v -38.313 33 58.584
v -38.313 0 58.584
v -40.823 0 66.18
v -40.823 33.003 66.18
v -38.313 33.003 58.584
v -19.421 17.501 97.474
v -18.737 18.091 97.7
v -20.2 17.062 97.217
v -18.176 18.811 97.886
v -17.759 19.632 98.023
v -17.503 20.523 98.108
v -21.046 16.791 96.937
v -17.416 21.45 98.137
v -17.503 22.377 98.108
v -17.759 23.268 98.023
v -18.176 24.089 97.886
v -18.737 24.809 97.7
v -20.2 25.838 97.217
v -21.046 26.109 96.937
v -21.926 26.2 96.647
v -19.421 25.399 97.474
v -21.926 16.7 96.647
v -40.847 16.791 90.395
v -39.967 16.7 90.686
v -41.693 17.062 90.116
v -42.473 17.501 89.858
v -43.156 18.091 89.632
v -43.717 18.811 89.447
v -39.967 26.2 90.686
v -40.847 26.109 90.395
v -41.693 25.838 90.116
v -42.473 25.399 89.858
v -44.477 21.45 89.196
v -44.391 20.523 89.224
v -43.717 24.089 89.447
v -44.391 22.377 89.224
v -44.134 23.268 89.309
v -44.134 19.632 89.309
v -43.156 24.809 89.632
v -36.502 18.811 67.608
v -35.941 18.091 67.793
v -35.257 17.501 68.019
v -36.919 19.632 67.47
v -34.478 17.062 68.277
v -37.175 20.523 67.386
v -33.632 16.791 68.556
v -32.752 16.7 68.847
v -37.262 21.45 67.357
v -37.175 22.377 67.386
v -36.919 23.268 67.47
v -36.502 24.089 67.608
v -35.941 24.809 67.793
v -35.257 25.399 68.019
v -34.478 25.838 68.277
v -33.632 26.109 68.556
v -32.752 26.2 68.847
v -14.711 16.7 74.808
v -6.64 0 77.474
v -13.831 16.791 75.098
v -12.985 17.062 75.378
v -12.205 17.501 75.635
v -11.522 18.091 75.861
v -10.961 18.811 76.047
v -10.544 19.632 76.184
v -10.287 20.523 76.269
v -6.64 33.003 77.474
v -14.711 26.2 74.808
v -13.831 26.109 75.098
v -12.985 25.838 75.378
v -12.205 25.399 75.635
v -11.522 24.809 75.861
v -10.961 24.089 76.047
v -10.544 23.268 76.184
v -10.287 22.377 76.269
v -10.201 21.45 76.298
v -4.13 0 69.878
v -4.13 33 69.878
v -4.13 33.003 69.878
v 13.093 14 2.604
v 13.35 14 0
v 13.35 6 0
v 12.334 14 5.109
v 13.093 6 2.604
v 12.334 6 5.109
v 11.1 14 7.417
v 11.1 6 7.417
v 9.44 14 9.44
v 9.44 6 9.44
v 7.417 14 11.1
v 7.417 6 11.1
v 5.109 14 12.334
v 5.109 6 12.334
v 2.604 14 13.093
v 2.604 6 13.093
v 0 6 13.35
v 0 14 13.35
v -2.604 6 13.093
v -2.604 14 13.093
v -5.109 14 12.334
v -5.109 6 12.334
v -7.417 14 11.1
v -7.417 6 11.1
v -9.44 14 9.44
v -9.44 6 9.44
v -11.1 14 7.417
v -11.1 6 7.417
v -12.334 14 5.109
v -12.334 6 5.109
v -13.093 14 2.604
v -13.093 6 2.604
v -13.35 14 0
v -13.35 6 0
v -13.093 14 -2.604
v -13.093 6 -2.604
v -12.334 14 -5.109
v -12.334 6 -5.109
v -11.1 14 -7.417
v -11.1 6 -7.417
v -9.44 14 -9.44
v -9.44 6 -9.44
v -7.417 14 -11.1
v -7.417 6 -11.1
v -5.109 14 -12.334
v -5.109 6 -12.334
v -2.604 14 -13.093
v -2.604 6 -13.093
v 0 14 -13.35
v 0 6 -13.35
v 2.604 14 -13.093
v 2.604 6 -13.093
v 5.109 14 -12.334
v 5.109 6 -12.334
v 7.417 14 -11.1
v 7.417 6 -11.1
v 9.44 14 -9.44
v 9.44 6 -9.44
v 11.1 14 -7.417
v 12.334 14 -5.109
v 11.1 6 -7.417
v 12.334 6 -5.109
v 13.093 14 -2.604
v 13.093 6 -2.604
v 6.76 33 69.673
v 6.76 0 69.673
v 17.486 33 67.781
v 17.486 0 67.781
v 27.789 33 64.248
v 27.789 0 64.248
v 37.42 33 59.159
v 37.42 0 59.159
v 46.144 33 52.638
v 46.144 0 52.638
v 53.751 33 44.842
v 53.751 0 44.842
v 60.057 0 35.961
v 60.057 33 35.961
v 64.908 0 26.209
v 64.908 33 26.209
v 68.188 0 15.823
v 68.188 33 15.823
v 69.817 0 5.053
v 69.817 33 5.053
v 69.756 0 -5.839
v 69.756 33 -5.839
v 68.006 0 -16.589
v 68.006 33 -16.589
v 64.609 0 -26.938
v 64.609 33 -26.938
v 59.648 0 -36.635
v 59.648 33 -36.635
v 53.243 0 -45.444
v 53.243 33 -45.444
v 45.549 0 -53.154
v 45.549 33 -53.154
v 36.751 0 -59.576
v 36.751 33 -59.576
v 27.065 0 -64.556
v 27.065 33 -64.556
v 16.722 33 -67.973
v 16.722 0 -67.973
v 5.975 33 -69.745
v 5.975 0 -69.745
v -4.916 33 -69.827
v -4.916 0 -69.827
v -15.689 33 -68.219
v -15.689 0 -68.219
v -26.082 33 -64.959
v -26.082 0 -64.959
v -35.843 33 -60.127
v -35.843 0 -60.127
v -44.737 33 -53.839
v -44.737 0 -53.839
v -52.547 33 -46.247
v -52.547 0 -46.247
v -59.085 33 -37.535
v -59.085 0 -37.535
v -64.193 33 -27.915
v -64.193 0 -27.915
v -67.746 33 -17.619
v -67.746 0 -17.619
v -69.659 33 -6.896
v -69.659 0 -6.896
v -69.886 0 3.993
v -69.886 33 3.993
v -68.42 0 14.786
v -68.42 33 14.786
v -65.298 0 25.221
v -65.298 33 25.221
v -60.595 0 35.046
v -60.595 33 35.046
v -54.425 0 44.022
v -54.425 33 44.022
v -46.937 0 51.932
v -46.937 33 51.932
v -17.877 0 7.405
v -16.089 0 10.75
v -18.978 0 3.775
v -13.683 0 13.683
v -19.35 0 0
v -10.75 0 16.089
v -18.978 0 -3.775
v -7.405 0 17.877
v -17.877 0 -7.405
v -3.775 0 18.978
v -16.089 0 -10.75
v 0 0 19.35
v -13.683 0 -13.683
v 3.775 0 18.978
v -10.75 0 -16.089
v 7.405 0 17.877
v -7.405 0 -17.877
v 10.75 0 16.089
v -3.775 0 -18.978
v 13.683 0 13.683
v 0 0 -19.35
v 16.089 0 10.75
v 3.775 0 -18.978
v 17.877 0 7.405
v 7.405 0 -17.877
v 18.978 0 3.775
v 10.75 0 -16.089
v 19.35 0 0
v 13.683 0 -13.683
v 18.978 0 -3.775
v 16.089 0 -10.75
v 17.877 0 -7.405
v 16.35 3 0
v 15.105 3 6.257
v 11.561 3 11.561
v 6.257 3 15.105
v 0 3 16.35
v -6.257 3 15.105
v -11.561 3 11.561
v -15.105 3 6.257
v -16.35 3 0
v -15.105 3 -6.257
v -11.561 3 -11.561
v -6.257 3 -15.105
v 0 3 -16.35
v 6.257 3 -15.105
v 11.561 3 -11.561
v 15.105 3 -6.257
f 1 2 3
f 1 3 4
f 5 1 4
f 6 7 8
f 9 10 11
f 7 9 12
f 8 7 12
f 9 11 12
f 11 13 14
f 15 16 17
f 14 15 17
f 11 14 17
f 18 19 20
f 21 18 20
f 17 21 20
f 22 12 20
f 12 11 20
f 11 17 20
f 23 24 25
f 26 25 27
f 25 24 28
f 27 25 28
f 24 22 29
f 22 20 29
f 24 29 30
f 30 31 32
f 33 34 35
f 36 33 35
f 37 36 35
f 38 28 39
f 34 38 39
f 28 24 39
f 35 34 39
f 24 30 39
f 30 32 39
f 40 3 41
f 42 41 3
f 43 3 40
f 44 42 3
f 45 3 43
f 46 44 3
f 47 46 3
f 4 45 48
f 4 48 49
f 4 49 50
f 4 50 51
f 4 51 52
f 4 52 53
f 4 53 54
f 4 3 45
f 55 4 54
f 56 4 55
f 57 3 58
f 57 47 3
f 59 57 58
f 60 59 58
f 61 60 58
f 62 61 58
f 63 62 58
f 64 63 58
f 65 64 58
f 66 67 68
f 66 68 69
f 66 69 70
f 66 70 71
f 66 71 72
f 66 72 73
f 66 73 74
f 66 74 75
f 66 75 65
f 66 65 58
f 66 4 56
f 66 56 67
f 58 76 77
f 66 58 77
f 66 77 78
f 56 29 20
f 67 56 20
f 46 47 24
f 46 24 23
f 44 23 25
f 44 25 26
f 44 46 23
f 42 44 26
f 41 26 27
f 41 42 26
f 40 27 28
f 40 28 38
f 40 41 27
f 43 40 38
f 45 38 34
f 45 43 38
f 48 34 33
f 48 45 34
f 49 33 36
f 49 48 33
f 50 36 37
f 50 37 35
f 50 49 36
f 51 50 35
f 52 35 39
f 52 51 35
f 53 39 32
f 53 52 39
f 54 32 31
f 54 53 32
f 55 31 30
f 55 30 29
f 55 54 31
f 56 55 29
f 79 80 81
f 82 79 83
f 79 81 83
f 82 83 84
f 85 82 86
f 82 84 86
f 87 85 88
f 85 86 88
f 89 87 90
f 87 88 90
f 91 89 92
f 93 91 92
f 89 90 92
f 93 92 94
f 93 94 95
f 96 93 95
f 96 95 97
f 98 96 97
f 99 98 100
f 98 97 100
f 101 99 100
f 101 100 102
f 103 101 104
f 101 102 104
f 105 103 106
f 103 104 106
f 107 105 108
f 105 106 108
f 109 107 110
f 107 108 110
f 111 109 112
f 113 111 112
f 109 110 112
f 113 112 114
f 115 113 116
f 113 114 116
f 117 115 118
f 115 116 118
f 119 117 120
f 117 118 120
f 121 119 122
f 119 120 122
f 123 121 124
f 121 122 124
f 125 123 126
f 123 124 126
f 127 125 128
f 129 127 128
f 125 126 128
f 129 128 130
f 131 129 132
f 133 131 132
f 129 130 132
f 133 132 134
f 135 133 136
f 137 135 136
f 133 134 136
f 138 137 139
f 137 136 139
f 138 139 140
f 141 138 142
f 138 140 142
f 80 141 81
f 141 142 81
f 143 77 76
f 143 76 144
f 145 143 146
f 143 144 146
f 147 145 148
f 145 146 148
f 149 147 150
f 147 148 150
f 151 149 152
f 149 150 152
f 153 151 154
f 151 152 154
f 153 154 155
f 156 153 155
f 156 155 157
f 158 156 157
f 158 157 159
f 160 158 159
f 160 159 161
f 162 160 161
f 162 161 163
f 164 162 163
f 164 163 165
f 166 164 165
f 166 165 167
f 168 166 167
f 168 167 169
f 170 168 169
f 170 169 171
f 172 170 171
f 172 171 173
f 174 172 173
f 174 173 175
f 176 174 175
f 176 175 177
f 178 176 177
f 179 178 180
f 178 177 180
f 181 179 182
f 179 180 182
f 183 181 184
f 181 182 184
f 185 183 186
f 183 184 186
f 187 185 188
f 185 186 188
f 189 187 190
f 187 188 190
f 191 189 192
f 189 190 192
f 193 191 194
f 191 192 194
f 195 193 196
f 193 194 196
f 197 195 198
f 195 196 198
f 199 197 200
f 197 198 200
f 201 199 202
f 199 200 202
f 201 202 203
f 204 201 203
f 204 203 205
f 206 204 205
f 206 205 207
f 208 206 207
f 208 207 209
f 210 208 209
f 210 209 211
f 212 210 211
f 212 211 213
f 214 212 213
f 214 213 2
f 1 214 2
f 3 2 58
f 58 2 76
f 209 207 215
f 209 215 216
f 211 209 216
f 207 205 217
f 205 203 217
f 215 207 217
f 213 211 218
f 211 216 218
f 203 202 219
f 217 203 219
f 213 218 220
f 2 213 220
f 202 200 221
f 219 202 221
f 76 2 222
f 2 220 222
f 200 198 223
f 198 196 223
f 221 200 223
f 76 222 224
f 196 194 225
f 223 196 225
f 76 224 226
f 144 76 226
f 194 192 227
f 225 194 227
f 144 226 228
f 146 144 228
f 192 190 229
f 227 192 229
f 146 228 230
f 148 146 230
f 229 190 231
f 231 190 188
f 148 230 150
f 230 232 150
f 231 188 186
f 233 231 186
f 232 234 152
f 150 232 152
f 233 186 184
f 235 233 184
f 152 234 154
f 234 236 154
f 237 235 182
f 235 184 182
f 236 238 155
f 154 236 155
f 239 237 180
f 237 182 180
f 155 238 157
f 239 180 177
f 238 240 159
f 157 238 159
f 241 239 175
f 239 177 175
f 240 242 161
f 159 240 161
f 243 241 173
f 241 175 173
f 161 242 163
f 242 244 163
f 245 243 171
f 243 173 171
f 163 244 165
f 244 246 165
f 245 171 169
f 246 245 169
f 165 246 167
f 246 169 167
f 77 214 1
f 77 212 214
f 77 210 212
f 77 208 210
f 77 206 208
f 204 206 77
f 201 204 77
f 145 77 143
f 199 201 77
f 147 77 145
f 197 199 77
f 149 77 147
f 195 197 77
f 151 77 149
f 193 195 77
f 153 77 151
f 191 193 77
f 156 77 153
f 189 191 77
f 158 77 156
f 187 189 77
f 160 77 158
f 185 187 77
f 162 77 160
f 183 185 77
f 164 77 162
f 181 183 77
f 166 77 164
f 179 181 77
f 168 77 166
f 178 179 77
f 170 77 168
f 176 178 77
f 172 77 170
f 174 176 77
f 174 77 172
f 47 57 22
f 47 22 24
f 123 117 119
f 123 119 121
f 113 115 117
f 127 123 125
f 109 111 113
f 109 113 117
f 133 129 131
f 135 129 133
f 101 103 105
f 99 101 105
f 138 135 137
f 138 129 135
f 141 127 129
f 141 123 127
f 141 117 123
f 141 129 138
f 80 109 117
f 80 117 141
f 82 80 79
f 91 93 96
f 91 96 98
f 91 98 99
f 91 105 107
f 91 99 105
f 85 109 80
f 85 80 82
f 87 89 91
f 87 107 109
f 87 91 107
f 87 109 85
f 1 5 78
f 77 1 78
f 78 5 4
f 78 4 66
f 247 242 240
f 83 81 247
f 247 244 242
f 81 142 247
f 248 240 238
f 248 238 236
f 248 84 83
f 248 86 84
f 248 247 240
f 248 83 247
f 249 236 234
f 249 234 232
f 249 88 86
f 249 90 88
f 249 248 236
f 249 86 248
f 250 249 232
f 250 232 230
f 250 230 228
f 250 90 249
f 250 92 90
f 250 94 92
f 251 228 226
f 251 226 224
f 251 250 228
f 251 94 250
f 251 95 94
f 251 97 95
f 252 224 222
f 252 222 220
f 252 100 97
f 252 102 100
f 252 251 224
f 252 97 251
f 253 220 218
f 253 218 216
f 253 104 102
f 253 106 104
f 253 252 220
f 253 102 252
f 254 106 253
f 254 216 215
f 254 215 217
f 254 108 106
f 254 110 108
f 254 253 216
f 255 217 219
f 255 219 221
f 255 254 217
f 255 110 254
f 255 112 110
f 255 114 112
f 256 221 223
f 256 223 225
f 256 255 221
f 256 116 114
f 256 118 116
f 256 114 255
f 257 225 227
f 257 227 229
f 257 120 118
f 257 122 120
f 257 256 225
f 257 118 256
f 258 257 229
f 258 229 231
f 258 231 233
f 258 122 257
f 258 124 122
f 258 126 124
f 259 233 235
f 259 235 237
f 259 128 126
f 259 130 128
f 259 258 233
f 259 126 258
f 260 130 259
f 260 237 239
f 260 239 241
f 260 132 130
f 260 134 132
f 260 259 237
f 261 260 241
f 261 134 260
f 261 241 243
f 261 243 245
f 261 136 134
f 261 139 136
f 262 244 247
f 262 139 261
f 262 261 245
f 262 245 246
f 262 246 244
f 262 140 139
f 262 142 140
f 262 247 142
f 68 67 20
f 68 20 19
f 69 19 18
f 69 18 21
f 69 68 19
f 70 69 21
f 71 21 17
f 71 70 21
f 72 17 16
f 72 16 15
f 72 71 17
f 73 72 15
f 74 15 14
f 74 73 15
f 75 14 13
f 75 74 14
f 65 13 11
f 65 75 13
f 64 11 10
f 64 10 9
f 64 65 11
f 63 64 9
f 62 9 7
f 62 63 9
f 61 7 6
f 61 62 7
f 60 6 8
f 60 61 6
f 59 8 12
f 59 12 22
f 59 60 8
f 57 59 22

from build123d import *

# Parameters (mm, degrees)
SKETCH1_R           = 70
BOSS_EXTRUDE1_DEPTH = 33
SKETCH4_W           = 36
SKETCH4_H           = 33.003390547
BOSS_EXTRUDE2_DEPTH = 8
BOSS_EXTRUDE3_DEPTH = 23
SKETCH10_R          = 13.35
CUT_EXTRUDE1_DEPTH  = 14
CHAMFER2_SIZE       = 6


with BuildPart() as part:
    # Sketch1 → Boss-Extrude1 (new body)
    with BuildSketch(Plane(origin=(0, 0, 0), x_dir=(1, 0, 0), z_dir=(0, 1, 0))):
        Circle(SKETCH1_R)
    extrude(amount=BOSS_EXTRUDE1_DEPTH)

    # Sketch4 → Boss-Extrude2 (add)
    with BuildSketch(Plane(origin=(-21.221579415, 0, 64.231180646), x_dir=(0.949517333, 0, 0.313714574), z_dir=(-0.313714574, 0, 0.949517333))):
        with Locations((0, 16.501695274)):
            Rectangle(SKETCH4_W, SKETCH4_H)
    extrude(amount=BOSS_EXTRUDE2_DEPTH)

    # Sketch7 → Boss-Extrude3 (add)
    with BuildSketch(Plane(origin=(-23.731296009, 0, 71.827319311), x_dir=(0.949517333, 0, 0.313714574), z_dir=(-0.313714574, 0, 0.949517333))):
        with BuildLine():
            Line((-9.5, 26.2), (9.5, 26.2))
            ThreePointArc((9.5, 26.2), (14.25, 21.45), (9.5, 16.7))
            Line((9.5, 16.7), (-9.5, 16.7))
            ThreePointArc((-9.5, 16.7), (-14.25, 21.45), (-9.5, 26.2))
        make_face()
    extrude(amount=BOSS_EXTRUDE3_DEPTH)

    # Sketch10 → Cut-Extrude1 (cut)
    with BuildSketch(Plane.XZ):
        Circle(SKETCH10_R)
    extrude(amount=-CUT_EXTRUDE1_DEPTH, mode=Mode.SUBTRACT)

    # Chamfer2
    chamfer2_edges = [part.edges().sort_by_distance(p)[0] for p in [
        (-13.35, 0, 0),
    ]]
    chamfer(chamfer2_edges, length=CHAMFER2_SIZE)


solid = part.part
